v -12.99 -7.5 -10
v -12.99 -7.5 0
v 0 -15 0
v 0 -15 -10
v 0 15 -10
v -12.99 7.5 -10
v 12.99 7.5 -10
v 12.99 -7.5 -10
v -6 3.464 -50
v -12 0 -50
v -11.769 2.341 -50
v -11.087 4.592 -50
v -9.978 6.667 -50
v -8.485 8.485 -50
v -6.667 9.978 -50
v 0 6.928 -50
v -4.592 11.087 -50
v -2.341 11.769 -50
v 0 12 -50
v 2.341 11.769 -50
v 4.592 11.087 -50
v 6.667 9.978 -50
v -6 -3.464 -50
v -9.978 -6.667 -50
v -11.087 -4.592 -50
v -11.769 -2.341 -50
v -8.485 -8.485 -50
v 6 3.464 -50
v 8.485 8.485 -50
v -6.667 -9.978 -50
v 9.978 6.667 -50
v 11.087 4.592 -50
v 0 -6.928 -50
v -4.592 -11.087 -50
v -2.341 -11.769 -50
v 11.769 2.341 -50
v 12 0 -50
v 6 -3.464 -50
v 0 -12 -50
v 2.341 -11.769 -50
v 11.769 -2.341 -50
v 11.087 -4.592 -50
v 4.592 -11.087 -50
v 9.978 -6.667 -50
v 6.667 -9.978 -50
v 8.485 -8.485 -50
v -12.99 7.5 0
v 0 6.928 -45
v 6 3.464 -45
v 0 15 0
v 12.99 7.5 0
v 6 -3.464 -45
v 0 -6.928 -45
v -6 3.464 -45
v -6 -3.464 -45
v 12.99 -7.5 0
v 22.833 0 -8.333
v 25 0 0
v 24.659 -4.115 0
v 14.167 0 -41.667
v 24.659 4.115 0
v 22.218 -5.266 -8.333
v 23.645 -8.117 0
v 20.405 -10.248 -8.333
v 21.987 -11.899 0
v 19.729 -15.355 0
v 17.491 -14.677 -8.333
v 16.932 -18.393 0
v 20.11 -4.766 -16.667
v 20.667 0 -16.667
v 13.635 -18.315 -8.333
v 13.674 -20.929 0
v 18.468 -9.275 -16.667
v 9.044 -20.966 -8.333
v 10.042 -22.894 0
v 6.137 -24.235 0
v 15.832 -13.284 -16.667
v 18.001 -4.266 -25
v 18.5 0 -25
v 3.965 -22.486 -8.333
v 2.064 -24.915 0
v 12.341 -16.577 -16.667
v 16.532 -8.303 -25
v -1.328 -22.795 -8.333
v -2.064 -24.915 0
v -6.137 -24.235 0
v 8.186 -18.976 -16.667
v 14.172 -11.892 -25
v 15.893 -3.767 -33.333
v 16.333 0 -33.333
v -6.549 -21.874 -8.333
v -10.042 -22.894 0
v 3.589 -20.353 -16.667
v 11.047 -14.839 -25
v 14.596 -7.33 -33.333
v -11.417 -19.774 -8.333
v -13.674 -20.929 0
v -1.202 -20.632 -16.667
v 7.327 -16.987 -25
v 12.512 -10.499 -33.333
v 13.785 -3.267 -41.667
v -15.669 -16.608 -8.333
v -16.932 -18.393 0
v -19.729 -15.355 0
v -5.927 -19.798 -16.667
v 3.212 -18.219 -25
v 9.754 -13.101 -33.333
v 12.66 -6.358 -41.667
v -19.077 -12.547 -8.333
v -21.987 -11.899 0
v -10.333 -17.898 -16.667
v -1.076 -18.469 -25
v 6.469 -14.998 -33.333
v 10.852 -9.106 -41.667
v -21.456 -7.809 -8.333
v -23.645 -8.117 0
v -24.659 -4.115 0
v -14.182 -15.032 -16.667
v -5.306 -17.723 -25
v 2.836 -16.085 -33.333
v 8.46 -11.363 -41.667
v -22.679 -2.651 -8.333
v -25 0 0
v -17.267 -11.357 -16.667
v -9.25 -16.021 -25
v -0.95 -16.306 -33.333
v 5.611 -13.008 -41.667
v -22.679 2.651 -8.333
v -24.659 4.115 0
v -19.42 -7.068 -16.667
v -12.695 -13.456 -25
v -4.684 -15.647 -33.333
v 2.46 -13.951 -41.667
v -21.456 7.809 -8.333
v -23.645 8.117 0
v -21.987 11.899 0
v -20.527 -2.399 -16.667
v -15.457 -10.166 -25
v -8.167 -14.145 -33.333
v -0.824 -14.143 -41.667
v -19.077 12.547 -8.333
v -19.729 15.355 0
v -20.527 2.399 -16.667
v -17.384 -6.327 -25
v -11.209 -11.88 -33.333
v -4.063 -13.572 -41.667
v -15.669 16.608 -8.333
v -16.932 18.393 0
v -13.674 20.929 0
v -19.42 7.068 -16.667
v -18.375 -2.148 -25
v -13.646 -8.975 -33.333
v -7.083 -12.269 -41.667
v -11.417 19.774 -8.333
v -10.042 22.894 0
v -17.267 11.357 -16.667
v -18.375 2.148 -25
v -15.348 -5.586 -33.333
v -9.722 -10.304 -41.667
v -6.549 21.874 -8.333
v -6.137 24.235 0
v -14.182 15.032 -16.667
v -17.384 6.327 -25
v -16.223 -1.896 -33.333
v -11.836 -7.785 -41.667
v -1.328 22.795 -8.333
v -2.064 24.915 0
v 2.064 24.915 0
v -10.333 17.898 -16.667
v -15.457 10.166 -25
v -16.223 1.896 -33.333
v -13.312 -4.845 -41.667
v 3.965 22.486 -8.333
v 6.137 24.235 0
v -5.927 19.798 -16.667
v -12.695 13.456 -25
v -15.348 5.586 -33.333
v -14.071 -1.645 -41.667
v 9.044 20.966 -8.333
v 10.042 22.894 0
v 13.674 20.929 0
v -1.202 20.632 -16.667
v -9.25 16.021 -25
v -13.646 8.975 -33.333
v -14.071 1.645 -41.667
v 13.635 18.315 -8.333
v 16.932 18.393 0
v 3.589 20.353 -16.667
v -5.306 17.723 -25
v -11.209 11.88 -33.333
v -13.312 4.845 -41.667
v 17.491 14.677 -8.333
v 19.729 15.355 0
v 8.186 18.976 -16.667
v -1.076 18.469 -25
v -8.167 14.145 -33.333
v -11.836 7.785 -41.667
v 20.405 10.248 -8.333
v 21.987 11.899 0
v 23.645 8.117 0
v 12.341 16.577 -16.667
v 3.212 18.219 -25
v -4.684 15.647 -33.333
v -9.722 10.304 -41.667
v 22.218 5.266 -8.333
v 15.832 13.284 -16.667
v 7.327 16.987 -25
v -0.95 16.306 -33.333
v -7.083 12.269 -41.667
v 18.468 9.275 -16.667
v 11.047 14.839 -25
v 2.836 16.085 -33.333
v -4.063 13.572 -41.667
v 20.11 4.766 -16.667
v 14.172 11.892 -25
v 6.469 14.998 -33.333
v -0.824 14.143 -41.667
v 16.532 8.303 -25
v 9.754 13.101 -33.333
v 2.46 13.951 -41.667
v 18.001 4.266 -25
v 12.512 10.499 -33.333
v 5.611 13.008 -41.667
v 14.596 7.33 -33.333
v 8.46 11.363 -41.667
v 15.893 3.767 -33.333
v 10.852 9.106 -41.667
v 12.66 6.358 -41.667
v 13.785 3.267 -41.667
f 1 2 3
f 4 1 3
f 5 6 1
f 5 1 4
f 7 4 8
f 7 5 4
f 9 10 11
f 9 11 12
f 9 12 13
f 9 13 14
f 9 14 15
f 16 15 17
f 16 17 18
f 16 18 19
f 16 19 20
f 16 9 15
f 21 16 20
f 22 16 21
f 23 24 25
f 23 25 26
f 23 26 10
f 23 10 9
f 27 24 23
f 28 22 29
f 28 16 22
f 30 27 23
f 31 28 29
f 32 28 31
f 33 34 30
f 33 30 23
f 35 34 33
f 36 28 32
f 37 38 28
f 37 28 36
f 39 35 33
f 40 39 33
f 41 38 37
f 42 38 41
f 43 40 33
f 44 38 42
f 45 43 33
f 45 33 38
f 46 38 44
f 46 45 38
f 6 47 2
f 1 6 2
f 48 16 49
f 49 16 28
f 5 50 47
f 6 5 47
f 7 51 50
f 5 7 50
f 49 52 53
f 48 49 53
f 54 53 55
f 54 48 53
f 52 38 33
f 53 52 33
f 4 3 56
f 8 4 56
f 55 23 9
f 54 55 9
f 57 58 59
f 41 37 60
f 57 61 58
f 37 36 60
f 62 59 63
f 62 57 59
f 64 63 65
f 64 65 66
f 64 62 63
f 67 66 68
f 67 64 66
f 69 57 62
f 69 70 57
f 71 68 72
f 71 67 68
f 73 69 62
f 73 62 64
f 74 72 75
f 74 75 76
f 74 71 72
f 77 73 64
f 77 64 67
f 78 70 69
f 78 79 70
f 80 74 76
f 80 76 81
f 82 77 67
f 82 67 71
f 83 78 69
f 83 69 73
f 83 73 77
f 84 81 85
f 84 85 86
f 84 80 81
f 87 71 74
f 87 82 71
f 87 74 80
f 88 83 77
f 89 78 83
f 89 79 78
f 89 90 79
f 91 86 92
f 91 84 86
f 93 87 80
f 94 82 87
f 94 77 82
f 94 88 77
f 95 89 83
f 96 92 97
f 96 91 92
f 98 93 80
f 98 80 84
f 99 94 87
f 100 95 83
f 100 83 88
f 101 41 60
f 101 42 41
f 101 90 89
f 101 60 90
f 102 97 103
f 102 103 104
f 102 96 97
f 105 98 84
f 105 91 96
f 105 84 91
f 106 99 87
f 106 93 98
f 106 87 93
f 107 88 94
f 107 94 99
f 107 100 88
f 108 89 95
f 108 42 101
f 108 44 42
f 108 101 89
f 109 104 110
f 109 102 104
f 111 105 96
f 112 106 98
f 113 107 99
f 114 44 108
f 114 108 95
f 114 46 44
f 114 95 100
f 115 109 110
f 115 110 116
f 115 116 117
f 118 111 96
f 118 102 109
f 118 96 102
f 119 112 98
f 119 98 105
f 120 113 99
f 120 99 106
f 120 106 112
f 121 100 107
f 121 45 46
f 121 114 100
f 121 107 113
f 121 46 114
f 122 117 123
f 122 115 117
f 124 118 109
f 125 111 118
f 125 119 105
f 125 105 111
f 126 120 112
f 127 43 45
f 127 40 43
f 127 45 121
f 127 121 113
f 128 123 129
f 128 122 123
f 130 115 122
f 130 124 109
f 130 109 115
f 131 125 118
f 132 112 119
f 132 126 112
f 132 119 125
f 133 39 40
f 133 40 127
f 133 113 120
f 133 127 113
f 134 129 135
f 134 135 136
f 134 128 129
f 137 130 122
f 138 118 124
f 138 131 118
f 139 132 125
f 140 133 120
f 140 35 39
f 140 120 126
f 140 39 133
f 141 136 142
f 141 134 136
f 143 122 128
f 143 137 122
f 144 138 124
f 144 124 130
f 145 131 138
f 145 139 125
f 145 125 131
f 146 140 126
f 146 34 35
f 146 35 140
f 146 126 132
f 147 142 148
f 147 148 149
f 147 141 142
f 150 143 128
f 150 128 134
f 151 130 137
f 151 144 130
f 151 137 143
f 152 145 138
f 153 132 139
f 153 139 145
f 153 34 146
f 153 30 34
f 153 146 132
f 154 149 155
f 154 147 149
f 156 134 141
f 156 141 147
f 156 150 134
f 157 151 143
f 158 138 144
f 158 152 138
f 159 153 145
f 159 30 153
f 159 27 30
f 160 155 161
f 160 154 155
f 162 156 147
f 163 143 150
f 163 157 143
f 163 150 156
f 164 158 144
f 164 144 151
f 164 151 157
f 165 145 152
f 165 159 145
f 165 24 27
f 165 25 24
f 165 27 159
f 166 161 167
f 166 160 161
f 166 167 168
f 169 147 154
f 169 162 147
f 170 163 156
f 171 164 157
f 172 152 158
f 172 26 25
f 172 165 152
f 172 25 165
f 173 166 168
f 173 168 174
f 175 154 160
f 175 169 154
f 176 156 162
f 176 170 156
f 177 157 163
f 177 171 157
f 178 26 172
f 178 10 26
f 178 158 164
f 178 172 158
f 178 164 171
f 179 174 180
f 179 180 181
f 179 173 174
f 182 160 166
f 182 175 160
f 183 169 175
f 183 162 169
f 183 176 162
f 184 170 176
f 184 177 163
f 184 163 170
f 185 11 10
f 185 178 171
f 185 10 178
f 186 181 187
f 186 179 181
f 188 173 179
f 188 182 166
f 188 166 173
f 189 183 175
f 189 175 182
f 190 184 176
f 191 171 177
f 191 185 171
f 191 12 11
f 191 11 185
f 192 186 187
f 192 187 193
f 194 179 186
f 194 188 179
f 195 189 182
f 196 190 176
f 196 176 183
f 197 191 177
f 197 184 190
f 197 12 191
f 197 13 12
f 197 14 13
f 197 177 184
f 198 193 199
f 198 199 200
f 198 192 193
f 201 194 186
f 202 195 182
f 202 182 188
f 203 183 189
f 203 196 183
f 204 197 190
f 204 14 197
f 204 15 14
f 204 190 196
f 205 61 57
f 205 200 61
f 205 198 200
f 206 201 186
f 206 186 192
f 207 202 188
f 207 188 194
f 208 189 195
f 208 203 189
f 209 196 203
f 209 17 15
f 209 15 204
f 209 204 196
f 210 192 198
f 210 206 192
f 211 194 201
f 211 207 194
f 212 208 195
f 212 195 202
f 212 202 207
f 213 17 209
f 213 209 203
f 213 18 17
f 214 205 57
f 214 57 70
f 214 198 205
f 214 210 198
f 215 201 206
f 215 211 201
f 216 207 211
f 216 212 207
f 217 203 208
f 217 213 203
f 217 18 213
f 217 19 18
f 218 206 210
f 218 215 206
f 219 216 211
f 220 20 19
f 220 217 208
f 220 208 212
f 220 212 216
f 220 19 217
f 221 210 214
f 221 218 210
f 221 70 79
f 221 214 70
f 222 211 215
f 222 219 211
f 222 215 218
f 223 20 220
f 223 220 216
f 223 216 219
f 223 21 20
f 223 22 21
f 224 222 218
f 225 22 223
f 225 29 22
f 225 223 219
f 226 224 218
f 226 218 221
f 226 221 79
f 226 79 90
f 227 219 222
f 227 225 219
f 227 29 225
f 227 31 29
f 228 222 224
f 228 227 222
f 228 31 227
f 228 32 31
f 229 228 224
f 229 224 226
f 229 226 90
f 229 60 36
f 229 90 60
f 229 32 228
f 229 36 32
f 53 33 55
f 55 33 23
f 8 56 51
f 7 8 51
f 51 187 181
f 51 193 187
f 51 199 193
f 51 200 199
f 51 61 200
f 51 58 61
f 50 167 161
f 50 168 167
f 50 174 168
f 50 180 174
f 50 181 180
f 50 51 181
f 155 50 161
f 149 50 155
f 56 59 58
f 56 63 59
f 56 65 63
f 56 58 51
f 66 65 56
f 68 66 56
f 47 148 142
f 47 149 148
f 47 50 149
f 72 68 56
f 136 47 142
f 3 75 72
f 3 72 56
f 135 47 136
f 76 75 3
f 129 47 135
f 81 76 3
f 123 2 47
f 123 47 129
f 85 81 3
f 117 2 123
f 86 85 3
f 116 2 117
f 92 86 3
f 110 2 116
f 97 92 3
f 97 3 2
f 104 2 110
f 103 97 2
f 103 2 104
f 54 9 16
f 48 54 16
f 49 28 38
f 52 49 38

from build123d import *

# Parameters (mm, degrees)
CUT_EXTRUDE_1_DEPTH = 5
CUT_EXTRUDE_2_DEPTH = 10


with BuildPart() as part:
    # 草图1 → 旋转1 (revolve)
    with BuildSketch(Plane(origin=(0, 0, 0), x_dir=(1, 0, 0), z_dir=(0, 1, 0))):
        Polygon((12, 50), (0, 50), (0, 20), (19.8, 20), align=None)
        Polygon((19.8, 20), (0, 20), (0, 0), (25, 0), align=None)
    revolve(axis=Axis((0, 0, 0), (0, 0, -1)))

    # 草图2 → 切除-拉伸1 (cut)
    with BuildSketch(Plane(origin=(0, 0, -50), x_dir=(-1, 0, 0), z_dir=(0, 0, -1))):
        Polygon((0, 6.92820323), (-6, 3.464101615), (-6, -3.464101615), (0, -6.92820323), (6, -3.464101615), (6, 3.464101615), align=None)
    extrude(amount=-CUT_EXTRUDE_1_DEPTH, mode=Mode.SUBTRACT)

    # 草图3 → 切除-拉伸2 (cut)
    with BuildSketch(Plane.XY):
        Polygon((0, 15), (-12.990381057, 7.5), (-12.990381057, -7.5), (0, -15), (12.990381057, -7.5), (12.990381057, 7.5), align=None)
    extrude(amount=-CUT_EXTRUDE_2_DEPTH, mode=Mode.SUBTRACT)


solid = part.part
